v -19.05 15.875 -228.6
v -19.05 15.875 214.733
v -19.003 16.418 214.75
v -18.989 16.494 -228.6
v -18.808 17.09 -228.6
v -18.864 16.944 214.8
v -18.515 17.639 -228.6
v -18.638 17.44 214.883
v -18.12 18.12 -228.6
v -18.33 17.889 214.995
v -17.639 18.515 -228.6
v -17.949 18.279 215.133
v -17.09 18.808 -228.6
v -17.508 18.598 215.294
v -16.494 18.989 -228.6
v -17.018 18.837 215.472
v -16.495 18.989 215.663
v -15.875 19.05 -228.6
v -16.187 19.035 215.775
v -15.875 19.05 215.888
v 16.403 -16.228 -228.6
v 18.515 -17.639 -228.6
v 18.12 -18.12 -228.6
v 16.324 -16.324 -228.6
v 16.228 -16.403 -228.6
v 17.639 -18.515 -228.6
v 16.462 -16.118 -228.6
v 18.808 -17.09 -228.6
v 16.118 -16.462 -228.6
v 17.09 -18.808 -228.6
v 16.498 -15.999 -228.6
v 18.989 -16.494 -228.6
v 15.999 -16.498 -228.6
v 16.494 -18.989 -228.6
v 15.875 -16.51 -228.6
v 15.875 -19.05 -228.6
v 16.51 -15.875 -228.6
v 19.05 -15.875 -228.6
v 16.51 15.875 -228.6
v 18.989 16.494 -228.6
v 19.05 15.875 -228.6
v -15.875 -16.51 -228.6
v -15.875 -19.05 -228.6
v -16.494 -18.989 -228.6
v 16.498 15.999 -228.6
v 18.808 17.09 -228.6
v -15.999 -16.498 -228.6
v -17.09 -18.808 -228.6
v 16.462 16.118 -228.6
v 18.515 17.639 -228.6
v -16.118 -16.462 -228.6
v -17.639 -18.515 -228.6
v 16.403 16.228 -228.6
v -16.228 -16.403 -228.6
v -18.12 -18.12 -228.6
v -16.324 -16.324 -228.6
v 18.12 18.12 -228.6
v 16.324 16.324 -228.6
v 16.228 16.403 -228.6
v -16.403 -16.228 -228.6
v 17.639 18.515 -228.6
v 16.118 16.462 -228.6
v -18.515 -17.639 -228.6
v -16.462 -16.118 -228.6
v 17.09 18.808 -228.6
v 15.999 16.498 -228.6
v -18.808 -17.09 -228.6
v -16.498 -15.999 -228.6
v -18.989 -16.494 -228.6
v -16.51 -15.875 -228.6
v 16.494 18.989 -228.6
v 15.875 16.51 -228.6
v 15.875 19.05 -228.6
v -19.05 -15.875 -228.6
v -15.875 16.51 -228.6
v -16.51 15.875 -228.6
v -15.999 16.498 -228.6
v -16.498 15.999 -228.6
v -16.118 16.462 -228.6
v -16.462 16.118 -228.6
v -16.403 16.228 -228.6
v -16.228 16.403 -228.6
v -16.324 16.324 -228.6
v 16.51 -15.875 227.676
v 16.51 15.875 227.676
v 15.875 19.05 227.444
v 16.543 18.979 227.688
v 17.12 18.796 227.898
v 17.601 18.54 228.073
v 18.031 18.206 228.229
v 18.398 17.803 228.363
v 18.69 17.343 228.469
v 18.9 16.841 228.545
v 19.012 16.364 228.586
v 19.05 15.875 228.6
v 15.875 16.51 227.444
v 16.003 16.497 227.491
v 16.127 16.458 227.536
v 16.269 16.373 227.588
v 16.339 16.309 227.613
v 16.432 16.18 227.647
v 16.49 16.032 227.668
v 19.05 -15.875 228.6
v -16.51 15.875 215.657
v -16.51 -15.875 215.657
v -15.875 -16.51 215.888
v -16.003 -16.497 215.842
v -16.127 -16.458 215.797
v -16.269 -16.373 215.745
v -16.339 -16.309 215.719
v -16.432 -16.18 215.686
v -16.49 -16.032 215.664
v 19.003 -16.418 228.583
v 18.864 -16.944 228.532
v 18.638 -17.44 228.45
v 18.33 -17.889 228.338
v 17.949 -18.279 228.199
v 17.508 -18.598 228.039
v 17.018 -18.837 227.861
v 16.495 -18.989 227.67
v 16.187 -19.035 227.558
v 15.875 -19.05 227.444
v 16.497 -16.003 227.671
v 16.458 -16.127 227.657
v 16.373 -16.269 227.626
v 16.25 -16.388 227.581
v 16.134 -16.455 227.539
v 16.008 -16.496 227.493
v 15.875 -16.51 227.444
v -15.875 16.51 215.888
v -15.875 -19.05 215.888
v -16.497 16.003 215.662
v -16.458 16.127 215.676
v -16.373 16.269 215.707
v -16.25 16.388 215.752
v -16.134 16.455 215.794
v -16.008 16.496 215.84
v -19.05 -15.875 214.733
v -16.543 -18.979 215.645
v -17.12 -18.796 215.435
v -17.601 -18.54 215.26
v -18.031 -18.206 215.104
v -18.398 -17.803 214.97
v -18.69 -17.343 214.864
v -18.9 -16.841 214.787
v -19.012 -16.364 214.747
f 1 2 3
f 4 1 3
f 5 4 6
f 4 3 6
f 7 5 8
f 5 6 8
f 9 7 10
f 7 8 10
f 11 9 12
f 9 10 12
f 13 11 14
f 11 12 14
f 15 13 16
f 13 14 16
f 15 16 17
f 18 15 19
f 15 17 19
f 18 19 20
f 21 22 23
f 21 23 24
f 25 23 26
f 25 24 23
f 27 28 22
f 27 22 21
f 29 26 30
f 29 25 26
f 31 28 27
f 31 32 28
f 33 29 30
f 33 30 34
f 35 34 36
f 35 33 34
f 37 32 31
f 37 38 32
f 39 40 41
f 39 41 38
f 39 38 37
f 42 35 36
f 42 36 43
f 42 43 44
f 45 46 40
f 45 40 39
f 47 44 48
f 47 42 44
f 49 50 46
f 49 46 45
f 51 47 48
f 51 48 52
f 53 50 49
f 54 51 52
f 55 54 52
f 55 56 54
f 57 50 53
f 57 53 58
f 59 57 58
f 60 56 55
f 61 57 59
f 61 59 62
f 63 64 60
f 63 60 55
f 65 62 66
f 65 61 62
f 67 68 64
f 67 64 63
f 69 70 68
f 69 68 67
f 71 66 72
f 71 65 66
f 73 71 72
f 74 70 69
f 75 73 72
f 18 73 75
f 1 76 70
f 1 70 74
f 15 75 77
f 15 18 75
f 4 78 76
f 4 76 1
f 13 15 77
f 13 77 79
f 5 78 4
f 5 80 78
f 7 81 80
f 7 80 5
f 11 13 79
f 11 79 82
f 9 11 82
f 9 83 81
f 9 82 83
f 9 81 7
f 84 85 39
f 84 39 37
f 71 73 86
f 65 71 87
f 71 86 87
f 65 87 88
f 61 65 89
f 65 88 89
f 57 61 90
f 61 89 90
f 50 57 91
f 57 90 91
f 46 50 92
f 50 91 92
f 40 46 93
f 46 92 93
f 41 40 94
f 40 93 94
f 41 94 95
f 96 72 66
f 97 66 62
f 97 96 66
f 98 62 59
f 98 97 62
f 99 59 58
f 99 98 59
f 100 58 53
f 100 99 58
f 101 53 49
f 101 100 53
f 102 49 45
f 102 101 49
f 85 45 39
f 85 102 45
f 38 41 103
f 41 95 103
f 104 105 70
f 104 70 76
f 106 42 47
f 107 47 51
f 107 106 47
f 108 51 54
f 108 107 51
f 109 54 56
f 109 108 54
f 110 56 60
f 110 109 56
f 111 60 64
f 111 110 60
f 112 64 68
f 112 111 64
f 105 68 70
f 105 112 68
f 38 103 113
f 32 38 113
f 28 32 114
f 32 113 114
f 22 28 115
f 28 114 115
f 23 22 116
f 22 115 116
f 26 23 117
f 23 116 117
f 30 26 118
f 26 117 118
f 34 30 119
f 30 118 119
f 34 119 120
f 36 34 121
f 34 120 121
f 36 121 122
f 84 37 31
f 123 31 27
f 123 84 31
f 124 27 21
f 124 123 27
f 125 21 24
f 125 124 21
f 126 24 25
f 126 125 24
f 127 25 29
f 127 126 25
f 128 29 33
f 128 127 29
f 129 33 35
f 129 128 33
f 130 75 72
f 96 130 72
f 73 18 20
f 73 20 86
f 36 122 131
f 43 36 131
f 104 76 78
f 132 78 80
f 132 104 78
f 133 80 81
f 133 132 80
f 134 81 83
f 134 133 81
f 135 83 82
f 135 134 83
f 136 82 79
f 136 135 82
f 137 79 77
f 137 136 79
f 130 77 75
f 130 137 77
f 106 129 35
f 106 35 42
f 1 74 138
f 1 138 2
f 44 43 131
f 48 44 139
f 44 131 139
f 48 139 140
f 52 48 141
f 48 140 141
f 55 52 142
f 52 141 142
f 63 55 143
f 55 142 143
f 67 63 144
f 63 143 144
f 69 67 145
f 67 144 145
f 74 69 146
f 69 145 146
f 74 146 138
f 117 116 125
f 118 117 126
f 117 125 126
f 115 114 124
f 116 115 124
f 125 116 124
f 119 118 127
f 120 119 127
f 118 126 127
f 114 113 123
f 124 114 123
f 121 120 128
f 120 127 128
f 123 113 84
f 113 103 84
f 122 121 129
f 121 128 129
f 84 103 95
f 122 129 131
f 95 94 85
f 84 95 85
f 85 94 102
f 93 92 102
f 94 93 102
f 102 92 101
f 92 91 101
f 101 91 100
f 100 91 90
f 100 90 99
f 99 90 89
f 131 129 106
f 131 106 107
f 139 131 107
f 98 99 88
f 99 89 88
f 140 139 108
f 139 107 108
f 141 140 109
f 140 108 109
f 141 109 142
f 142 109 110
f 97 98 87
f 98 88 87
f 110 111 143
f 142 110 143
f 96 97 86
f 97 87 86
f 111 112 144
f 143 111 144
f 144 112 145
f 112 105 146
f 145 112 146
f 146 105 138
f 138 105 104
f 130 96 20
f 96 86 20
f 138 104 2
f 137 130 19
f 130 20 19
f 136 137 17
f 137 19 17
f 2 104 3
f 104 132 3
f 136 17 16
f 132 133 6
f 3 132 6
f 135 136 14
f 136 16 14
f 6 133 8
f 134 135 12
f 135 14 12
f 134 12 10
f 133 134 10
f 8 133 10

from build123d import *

# Parameters (mm, degrees)
EXTRUDE_THIN1_DEPTH     = 228.6
CUT_EXTRUDE1_DEPTH      = 1
CUT_EXTRUDE1_DEPTH_BACK = 39.1


with BuildPart() as part:
    # Sketch1 → Extrude-Thin1 (new body, symmetric)
    with BuildSketch(Plane.XY):
        with BuildLine():
            Line((-15.875, 19.05), (15.875, 19.05))
            ThreePointArc((15.875, 19.05), (18.12006403, 18.12006403), (19.05, 15.875))
            Line((19.05, 15.875), (19.05, -15.875))
            ThreePointArc((19.05, -15.875), (18.12006403, -18.12006403), (15.875, -19.05))
            Line((15.875, -19.05), (-15.875, -19.05))
            ThreePointArc((-15.875, -19.05), (-18.12006403, -18.12006403), (-19.05, -15.875))
            Line((-19.05, -15.875), (-19.05, 15.875))
            ThreePointArc((-19.05, 15.875), (-18.12006403, 18.12006403), (-15.875, 19.05))
        make_face()
        with BuildLine():
            Line((-15.875, 16.51), (15.875, 16.51))
            ThreePointArc((15.875, 16.51), (16.324012806, 16.324012806), (16.51, 15.875))
            Line((16.51, 15.875), (16.51, -15.875))
            ThreePointArc((16.51, -15.875), (16.324012806, -16.324012806), (15.875, -16.51))
            Line((15.875, -16.51), (-15.875, -16.51))
            ThreePointArc((-15.875, -16.51), (-16.324012806, -16.324012806), (-16.51, -15.875))
            Line((-16.51, -15.875), (-16.51, 15.875))
            ThreePointArc((-16.51, 15.875), (-16.324012806, 16.324012806), (-15.875, 16.51))
        make_face(mode=Mode.SUBTRACT)
    extrude(amount=EXTRUDE_THIN1_DEPTH, both=True)

    # Sketch3 → Cut-Extrude1 (cut, two sides)
    with BuildSketch(Plane(origin=(0, 19.05, 0), x_dir=(1, 0, 0), z_dir=(0, 1, 0))) as cut_extrude1_sk:
        Polygon((890.680220904, -545.847455696), (19.05, -228.6), (-19.05, -214.732734074), (-890.680220904, 102.514721621), (-1525.175132295, -1640.745720186), (256.185309512, -2289.107897503), align=None)
    extrude(amount=CUT_EXTRUDE1_DEPTH, mode=Mode.SUBTRACT)
    extrude(cut_extrude1_sk.sketch, amount=-CUT_EXTRUDE1_DEPTH_BACK, mode=Mode.SUBTRACT)


solid = part.part
